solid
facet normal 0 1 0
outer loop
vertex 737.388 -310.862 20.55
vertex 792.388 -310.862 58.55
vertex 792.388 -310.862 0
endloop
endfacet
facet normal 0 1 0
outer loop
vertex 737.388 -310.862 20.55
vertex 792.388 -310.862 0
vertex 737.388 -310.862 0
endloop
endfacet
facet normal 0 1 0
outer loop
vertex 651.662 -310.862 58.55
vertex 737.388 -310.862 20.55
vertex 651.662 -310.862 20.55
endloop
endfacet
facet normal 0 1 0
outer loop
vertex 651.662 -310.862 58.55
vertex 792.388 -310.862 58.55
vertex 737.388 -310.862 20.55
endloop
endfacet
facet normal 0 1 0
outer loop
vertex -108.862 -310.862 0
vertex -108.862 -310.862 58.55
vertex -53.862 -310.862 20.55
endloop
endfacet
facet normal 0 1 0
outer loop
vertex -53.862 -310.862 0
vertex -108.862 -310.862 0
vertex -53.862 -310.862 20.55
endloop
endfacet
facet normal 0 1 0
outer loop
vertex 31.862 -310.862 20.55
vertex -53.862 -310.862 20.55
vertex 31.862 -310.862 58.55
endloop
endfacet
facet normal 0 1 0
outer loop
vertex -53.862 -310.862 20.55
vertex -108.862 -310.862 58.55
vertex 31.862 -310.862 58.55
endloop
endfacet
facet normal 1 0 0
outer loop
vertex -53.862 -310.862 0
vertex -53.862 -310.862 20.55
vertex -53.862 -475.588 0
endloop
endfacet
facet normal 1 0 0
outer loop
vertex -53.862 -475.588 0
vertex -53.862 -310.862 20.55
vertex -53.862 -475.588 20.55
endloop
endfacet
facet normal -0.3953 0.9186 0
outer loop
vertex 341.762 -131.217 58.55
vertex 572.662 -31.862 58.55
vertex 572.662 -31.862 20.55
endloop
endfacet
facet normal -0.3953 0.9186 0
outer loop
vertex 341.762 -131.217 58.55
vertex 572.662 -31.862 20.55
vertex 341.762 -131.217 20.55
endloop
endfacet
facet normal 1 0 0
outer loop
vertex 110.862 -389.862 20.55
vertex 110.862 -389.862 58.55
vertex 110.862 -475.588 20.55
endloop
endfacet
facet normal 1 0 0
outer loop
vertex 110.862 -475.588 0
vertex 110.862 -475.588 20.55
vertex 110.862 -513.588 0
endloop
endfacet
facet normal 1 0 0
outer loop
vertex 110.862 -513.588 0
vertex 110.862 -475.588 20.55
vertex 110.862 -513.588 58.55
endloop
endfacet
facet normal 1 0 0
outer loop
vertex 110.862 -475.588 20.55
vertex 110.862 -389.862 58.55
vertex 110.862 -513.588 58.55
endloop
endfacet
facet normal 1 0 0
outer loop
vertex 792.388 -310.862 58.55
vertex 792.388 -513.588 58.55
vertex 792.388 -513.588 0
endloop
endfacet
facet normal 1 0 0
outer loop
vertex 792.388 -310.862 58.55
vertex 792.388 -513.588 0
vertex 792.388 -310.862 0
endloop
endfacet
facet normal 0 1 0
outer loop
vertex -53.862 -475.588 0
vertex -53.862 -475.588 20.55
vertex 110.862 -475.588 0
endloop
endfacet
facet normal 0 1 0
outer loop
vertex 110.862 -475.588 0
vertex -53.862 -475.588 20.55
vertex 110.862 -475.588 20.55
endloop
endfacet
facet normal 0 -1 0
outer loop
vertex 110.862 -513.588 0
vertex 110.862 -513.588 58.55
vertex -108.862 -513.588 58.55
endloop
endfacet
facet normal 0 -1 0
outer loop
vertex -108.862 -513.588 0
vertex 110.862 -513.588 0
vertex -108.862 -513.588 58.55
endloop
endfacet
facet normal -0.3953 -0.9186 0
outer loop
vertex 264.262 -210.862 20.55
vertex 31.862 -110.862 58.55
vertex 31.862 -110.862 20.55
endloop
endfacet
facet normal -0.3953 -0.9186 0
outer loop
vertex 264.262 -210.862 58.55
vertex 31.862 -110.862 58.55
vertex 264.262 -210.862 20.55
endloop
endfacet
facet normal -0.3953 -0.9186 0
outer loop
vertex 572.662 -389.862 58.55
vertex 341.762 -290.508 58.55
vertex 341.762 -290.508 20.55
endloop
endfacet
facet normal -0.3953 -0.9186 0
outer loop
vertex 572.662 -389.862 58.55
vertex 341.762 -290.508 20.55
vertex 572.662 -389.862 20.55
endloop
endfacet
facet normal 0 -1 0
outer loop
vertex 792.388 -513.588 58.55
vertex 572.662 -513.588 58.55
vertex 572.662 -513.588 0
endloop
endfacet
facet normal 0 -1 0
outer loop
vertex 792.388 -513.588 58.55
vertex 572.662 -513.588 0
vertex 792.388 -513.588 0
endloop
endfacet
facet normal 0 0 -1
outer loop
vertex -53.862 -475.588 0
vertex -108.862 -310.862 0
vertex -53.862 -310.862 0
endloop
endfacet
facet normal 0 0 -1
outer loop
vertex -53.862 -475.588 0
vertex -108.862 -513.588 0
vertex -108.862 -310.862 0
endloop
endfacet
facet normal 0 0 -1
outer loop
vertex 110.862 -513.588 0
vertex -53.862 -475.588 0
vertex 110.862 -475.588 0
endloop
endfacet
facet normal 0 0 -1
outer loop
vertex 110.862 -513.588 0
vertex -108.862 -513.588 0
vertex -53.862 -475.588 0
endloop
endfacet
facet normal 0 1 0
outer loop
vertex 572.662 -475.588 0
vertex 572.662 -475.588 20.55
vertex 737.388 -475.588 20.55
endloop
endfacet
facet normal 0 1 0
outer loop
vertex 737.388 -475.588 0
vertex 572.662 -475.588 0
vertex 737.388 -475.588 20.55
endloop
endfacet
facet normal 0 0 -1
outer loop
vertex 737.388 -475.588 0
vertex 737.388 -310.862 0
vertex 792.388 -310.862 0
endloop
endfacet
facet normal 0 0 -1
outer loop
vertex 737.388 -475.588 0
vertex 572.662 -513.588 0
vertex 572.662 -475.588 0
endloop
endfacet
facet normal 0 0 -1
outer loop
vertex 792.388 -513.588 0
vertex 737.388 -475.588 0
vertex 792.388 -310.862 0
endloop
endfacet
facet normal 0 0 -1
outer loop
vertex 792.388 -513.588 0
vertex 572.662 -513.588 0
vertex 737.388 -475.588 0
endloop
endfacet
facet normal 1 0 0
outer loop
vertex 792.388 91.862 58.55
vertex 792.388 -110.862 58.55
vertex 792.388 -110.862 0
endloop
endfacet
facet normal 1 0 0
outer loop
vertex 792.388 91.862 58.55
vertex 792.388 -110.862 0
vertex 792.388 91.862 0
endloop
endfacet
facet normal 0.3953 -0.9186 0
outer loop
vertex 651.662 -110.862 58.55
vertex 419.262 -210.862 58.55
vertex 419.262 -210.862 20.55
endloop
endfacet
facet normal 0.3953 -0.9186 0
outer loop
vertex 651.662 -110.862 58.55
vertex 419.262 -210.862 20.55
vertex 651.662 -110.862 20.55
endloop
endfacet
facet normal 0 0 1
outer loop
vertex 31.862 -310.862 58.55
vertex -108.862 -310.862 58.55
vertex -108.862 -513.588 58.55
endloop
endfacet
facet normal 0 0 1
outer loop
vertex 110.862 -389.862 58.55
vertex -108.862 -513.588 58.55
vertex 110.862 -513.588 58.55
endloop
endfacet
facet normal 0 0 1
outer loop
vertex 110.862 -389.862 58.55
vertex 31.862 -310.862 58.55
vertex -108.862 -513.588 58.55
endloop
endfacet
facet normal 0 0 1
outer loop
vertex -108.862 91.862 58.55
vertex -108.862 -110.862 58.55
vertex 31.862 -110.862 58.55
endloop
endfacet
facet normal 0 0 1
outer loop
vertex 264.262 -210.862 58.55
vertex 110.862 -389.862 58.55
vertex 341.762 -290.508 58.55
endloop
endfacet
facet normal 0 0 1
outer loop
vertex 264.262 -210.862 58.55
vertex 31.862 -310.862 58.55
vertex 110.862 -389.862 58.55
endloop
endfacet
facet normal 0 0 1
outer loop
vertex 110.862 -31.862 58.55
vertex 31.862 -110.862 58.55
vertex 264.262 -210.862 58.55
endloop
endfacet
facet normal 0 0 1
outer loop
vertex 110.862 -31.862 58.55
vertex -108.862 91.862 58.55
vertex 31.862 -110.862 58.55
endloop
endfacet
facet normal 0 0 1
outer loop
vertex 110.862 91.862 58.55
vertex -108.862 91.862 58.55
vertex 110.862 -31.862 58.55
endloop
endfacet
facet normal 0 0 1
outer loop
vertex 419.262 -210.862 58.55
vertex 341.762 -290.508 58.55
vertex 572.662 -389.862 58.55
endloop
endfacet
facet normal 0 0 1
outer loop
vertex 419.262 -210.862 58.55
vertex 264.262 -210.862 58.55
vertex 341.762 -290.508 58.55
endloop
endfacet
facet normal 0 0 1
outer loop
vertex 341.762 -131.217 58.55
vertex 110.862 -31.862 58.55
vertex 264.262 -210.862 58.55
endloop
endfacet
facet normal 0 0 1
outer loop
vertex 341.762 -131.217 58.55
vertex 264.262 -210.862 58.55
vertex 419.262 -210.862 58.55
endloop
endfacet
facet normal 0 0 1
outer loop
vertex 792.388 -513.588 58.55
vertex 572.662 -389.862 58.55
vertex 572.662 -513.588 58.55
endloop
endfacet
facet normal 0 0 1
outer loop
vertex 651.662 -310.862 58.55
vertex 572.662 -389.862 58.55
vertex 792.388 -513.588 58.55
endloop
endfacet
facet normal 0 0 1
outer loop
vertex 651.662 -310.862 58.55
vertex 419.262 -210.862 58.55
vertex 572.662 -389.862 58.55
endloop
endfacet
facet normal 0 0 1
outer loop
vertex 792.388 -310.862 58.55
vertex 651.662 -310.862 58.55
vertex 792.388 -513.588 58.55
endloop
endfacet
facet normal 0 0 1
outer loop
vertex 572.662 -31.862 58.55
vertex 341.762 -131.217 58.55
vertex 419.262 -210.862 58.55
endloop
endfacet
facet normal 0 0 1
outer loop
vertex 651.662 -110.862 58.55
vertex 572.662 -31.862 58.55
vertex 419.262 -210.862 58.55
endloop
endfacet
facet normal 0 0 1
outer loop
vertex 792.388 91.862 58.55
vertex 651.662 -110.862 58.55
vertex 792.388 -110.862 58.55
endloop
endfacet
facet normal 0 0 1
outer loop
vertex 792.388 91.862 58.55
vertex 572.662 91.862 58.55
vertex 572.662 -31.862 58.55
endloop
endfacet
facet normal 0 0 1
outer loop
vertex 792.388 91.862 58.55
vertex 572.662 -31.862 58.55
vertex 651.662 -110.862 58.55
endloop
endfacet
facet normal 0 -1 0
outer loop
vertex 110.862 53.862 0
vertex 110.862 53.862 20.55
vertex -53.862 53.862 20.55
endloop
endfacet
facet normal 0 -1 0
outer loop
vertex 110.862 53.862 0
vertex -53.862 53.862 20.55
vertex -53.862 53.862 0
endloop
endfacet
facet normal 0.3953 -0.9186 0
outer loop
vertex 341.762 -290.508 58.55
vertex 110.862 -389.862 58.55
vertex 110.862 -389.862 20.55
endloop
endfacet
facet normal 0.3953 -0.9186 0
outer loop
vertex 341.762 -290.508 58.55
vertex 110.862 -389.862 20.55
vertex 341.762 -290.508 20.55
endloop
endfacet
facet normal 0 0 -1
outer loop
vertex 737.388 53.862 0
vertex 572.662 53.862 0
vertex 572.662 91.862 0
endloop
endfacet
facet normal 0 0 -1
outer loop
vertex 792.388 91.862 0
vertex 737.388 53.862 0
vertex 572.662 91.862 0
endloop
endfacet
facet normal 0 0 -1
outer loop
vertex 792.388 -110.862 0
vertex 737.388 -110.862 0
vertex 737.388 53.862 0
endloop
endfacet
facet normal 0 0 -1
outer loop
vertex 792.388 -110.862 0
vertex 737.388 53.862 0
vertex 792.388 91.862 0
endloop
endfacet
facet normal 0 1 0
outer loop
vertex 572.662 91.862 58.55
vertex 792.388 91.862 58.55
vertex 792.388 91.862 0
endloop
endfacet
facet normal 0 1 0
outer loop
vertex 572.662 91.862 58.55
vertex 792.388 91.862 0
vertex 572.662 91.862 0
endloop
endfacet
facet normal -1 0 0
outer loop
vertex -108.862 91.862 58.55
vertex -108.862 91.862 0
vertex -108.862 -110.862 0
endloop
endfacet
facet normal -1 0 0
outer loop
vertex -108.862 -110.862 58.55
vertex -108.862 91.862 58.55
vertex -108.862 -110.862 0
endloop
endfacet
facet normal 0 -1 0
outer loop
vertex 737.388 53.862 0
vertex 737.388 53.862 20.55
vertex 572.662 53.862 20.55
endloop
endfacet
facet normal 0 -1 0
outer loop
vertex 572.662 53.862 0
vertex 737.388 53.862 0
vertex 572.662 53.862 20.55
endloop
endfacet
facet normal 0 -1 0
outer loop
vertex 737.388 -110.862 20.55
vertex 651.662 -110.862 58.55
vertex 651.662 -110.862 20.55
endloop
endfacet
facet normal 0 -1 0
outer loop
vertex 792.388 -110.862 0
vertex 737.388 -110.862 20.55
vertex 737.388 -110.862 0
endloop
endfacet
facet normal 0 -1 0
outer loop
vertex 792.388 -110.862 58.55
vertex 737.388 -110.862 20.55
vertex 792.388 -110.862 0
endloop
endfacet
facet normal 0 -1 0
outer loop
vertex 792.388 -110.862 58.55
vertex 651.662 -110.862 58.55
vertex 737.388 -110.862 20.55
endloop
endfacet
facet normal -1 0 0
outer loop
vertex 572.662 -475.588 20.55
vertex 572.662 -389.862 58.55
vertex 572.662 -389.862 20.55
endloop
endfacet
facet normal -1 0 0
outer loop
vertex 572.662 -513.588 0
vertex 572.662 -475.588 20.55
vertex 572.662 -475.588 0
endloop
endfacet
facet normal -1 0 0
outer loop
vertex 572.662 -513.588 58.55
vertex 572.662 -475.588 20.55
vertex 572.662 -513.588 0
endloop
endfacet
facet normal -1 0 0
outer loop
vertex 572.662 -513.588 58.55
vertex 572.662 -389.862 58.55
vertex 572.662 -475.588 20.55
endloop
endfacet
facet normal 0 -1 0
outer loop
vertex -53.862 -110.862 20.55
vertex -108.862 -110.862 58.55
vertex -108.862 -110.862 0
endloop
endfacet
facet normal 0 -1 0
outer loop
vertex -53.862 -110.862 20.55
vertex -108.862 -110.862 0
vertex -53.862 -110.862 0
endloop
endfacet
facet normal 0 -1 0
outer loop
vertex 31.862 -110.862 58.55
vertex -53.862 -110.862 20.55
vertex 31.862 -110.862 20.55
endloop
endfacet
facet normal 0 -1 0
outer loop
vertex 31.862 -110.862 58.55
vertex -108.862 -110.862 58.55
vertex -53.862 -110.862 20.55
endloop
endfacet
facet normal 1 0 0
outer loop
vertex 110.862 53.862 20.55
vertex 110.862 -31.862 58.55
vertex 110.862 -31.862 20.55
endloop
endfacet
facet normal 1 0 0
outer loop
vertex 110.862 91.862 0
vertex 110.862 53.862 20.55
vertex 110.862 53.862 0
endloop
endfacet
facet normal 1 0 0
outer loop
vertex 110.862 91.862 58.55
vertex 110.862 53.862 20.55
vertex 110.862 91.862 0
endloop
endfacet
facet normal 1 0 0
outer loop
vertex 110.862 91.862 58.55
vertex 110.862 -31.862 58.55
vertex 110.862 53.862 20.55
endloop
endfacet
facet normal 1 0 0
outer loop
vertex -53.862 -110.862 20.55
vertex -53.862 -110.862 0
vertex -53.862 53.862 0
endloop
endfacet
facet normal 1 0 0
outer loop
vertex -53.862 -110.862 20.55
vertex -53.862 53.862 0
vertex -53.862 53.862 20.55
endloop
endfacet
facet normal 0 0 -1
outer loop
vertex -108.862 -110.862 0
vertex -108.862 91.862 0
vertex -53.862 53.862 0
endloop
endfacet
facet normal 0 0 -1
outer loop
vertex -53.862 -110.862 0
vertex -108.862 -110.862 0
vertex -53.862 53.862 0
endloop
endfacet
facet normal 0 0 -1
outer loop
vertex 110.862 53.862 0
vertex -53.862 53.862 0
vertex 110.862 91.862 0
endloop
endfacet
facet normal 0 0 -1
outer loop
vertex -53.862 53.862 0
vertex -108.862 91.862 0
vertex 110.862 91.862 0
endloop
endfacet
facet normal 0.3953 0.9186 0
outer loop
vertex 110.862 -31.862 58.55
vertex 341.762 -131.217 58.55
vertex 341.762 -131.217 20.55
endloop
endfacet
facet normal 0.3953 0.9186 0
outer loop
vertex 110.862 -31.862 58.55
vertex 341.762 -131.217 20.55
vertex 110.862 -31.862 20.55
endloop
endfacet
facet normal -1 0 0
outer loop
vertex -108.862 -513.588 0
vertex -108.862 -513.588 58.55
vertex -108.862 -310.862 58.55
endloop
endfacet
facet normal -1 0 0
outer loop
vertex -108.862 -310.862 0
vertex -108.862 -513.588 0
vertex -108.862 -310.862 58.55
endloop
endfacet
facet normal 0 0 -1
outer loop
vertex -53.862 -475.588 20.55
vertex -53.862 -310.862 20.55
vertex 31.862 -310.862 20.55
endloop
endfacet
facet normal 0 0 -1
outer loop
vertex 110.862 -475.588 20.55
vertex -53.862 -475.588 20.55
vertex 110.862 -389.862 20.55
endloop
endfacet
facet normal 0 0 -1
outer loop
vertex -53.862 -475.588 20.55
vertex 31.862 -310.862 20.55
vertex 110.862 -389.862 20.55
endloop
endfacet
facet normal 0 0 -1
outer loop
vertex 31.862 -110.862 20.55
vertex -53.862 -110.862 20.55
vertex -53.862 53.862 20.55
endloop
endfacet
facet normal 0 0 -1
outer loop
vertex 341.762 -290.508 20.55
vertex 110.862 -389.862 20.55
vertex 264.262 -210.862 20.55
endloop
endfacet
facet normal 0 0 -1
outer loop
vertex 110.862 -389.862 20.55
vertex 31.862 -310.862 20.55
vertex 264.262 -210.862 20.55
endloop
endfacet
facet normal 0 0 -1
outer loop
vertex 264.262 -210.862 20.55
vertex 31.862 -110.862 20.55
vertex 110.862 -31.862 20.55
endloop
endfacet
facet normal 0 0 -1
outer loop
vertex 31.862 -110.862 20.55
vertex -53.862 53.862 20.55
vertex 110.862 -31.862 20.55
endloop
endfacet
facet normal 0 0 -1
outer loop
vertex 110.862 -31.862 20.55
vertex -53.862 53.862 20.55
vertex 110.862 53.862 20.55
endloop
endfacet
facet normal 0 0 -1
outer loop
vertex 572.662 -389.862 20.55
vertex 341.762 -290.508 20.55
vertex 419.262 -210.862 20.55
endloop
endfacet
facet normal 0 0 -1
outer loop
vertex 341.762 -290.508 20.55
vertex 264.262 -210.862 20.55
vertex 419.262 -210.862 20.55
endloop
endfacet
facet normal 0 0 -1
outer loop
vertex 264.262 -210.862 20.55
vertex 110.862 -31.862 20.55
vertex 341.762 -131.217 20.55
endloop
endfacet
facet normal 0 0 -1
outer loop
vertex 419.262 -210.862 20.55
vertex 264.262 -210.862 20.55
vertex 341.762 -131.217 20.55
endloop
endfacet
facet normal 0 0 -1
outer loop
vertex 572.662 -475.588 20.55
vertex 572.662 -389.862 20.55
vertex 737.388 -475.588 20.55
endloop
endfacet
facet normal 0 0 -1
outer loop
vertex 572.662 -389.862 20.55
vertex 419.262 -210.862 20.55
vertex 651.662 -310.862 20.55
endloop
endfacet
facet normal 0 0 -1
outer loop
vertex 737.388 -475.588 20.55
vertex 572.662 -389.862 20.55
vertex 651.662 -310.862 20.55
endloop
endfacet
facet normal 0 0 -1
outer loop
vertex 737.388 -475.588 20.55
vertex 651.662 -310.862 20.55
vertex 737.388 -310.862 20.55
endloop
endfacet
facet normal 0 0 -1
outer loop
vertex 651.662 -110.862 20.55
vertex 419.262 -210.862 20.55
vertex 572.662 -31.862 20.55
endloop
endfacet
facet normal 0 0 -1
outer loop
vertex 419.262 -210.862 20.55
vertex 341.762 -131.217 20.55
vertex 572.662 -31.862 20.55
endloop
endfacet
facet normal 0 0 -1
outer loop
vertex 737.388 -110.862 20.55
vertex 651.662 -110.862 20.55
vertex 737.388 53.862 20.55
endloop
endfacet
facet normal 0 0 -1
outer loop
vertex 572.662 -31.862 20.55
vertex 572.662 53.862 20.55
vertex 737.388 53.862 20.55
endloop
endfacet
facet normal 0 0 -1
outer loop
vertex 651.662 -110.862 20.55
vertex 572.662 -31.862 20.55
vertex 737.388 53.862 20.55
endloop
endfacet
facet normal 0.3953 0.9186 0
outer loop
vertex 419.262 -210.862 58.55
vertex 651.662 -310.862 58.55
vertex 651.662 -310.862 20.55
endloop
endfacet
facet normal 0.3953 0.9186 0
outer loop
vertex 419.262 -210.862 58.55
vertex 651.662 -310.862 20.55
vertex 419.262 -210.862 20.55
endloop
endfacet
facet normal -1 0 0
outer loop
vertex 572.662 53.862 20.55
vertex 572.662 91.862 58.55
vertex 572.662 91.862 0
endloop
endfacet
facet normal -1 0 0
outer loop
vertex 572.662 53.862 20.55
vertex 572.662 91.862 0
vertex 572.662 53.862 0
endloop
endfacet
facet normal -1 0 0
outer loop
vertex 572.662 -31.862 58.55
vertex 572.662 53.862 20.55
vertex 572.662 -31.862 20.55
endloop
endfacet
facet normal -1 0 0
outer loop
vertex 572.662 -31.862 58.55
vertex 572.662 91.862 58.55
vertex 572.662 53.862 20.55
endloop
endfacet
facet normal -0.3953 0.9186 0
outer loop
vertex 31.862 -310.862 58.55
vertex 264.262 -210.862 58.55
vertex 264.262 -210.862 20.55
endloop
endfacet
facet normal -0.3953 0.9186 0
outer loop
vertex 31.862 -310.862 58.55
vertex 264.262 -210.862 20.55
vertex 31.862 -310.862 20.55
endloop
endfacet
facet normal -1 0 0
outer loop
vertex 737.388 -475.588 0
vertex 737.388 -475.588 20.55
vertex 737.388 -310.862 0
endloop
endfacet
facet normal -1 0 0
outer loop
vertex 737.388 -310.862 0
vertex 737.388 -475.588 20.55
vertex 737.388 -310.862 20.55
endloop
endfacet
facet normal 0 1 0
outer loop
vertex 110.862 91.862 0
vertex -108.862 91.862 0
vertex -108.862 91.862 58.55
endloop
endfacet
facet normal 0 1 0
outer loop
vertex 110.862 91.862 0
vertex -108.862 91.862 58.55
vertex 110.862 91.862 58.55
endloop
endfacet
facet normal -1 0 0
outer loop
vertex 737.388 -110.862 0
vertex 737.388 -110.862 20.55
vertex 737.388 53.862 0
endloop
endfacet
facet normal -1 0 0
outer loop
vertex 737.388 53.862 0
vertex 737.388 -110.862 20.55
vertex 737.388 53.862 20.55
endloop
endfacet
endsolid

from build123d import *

# Parameters (mm, degrees)
F1_DEPTH  = 20.55
F2_W      = 215.725
F2_H      = 215.725
F3_DEPTH  = 38
F5_DEPTH  = 58.55
F6_W      = 76
F6_H      = 76
F7_DEPTH  = 38.001
F9_DEPTH  = 3
F11_DEPTH = 3
F12_W     = 221.725
F12_H     = 19
F13_DEPTH = 58.551
F14_W     = 2
F14_H     = 202.725
F15_DEPTH = 58.551
F17_DEPTH = 38
F19_DEPTH = 20.55


with BuildPart() as f1:
    # F0 (on Top) → F1 (new body)
    with BuildSketch(Plane.XY):
        Polygon((-53.8625, 53.8625), (107.8625, 53.8625), (107.8625, 107.8625), (-107.8625, 107.8625), (-107.8625, -107.8625), (-53.8625, -107.8625), align=None)
    extrude(amount=F1_DEPTH)

    # F2 (on face) → F3 (join)
    with BuildSketch(Plane.XY.offset(20.55)):
        Rectangle(F2_W, F2_H)
    extrude(amount=F3_DEPTH)

    # F4 (on face) → F5 (join, through all)
    with BuildSketch(Plane.XY.offset(58.55)):
        Polygon((-110.8625, -107.8625), (-107.8625, -107.8625), (-107.8625, 107.8625), (107.8625, 107.8625), (107.8625, 110.8625), (-110.8625, 110.8625), align=None)
    extrude(amount=-F5_DEPTH)

    # F6 (on face) → F7 (cut, through all)
    with BuildSketch(Plane(origin=(0, 0, 20.55), x_dir=(1, 0, 0), z_dir=(0, 0, -1))):
        with Locations((69.8625, 69.8625)):
            Rectangle(F6_W, F6_H)
    extrude(amount=-F7_DEPTH, mode=Mode.SUBTRACT)

    # F8 (on face) → F9 (join)
    with BuildSketch(Plane.YZ.offset(107.8625)):
        Polygon((110.8625, 58.55), (-31.8625, 58.55), (-31.8625, 20.55), (53.8625, 20.55), (53.8625, 0), (110.8625, 0), align=None)
    extrude(amount=F9_DEPTH)

    # F10 (on face) → F11 (join)
    with BuildSketch(Plane.XZ.offset(107.8625)):
        Polygon((31.8625, 58.55), (-110.8625, 58.55), (-110.8625, 0), (-53.8625, 0), (-53.8625, 20.55), (31.8625, 20.55), align=None)
    extrude(amount=F11_DEPTH)

    # F12 (on face) → F13 (cut, through all)
    with BuildSketch(Plane(origin=(0, 0, 0), x_dir=(1, 0, 0), z_dir=(0, 0, -1))):
        with Locations((0, -101.3625)):
            Rectangle(F12_W, F12_H)
    extrude(amount=-F13_DEPTH, mode=Mode.SUBTRACT)

    # F14 (on face) → F15 (cut, through all)
    with BuildSketch(Plane(origin=(0, 0, 0), x_dir=(1, 0, 0), z_dir=(0, 0, -1))):
        with Locations((-109.8625, 9.5)):
            Rectangle(F14_W, F14_H)
    extrude(amount=-F15_DEPTH, mode=Mode.SUBTRACT)

    # F16 (on face) → F17 (join)
    with BuildSketch(Plane.XY.offset(58.55)):
        Polygon((110.8625, -31.8625), (31.8625, -31.8625), (31.8625, -110.8625), (264.2625, -210.8625), (31.8625, -310.8625), (-108.8625, -310.8625), (-108.8625, -513.5875), (110.8625, -513.5875), (110.8625, -389.8625), (341.7625, -290.507939), (572.6625, -389.8625), (572.6625, -513.5875), (792.3875, -513.5875), (792.3875, -310.8625), (651.6625, -310.8625), (419.2625, -210.8625), (651.6625, -110.8625), (792.3875, -110.8625), (792.3875, 91.8625), (572.6625, 91.8625), (572.6625, -31.8625), (341.7625, -131.217061), align=None)
    extrude(amount=-F17_DEPTH)

    # F18 (on face) → F19 (join, through all)
    with BuildSketch(Plane(origin=(0, 0, 20.55), x_dir=(1, 0, 0), z_dir=(0, 0, -1))):
        Polygon((-108.8625, 310.8625), (-53.8625, 310.8625), (-53.8625, 475.5875), (110.8625, 475.5875), (110.8625, 513.5875), (-108.8625, 513.5875), align=None)
        Polygon((737.3875, 475.5875), (737.3875, 310.8625), (792.3875, 310.8625), (792.3875, 513.5875), (572.6625, 513.5875), (572.6625, 475.5875), align=None)
        Polygon((737.3875, -53.8625), (572.6625, -53.8625), (572.6625, -91.8625), (792.3875, -91.8625), (792.3875, 110.8625), (737.3875, 110.8625), align=None)
    extrude(amount=F19_DEPTH)


solid = f1.part
